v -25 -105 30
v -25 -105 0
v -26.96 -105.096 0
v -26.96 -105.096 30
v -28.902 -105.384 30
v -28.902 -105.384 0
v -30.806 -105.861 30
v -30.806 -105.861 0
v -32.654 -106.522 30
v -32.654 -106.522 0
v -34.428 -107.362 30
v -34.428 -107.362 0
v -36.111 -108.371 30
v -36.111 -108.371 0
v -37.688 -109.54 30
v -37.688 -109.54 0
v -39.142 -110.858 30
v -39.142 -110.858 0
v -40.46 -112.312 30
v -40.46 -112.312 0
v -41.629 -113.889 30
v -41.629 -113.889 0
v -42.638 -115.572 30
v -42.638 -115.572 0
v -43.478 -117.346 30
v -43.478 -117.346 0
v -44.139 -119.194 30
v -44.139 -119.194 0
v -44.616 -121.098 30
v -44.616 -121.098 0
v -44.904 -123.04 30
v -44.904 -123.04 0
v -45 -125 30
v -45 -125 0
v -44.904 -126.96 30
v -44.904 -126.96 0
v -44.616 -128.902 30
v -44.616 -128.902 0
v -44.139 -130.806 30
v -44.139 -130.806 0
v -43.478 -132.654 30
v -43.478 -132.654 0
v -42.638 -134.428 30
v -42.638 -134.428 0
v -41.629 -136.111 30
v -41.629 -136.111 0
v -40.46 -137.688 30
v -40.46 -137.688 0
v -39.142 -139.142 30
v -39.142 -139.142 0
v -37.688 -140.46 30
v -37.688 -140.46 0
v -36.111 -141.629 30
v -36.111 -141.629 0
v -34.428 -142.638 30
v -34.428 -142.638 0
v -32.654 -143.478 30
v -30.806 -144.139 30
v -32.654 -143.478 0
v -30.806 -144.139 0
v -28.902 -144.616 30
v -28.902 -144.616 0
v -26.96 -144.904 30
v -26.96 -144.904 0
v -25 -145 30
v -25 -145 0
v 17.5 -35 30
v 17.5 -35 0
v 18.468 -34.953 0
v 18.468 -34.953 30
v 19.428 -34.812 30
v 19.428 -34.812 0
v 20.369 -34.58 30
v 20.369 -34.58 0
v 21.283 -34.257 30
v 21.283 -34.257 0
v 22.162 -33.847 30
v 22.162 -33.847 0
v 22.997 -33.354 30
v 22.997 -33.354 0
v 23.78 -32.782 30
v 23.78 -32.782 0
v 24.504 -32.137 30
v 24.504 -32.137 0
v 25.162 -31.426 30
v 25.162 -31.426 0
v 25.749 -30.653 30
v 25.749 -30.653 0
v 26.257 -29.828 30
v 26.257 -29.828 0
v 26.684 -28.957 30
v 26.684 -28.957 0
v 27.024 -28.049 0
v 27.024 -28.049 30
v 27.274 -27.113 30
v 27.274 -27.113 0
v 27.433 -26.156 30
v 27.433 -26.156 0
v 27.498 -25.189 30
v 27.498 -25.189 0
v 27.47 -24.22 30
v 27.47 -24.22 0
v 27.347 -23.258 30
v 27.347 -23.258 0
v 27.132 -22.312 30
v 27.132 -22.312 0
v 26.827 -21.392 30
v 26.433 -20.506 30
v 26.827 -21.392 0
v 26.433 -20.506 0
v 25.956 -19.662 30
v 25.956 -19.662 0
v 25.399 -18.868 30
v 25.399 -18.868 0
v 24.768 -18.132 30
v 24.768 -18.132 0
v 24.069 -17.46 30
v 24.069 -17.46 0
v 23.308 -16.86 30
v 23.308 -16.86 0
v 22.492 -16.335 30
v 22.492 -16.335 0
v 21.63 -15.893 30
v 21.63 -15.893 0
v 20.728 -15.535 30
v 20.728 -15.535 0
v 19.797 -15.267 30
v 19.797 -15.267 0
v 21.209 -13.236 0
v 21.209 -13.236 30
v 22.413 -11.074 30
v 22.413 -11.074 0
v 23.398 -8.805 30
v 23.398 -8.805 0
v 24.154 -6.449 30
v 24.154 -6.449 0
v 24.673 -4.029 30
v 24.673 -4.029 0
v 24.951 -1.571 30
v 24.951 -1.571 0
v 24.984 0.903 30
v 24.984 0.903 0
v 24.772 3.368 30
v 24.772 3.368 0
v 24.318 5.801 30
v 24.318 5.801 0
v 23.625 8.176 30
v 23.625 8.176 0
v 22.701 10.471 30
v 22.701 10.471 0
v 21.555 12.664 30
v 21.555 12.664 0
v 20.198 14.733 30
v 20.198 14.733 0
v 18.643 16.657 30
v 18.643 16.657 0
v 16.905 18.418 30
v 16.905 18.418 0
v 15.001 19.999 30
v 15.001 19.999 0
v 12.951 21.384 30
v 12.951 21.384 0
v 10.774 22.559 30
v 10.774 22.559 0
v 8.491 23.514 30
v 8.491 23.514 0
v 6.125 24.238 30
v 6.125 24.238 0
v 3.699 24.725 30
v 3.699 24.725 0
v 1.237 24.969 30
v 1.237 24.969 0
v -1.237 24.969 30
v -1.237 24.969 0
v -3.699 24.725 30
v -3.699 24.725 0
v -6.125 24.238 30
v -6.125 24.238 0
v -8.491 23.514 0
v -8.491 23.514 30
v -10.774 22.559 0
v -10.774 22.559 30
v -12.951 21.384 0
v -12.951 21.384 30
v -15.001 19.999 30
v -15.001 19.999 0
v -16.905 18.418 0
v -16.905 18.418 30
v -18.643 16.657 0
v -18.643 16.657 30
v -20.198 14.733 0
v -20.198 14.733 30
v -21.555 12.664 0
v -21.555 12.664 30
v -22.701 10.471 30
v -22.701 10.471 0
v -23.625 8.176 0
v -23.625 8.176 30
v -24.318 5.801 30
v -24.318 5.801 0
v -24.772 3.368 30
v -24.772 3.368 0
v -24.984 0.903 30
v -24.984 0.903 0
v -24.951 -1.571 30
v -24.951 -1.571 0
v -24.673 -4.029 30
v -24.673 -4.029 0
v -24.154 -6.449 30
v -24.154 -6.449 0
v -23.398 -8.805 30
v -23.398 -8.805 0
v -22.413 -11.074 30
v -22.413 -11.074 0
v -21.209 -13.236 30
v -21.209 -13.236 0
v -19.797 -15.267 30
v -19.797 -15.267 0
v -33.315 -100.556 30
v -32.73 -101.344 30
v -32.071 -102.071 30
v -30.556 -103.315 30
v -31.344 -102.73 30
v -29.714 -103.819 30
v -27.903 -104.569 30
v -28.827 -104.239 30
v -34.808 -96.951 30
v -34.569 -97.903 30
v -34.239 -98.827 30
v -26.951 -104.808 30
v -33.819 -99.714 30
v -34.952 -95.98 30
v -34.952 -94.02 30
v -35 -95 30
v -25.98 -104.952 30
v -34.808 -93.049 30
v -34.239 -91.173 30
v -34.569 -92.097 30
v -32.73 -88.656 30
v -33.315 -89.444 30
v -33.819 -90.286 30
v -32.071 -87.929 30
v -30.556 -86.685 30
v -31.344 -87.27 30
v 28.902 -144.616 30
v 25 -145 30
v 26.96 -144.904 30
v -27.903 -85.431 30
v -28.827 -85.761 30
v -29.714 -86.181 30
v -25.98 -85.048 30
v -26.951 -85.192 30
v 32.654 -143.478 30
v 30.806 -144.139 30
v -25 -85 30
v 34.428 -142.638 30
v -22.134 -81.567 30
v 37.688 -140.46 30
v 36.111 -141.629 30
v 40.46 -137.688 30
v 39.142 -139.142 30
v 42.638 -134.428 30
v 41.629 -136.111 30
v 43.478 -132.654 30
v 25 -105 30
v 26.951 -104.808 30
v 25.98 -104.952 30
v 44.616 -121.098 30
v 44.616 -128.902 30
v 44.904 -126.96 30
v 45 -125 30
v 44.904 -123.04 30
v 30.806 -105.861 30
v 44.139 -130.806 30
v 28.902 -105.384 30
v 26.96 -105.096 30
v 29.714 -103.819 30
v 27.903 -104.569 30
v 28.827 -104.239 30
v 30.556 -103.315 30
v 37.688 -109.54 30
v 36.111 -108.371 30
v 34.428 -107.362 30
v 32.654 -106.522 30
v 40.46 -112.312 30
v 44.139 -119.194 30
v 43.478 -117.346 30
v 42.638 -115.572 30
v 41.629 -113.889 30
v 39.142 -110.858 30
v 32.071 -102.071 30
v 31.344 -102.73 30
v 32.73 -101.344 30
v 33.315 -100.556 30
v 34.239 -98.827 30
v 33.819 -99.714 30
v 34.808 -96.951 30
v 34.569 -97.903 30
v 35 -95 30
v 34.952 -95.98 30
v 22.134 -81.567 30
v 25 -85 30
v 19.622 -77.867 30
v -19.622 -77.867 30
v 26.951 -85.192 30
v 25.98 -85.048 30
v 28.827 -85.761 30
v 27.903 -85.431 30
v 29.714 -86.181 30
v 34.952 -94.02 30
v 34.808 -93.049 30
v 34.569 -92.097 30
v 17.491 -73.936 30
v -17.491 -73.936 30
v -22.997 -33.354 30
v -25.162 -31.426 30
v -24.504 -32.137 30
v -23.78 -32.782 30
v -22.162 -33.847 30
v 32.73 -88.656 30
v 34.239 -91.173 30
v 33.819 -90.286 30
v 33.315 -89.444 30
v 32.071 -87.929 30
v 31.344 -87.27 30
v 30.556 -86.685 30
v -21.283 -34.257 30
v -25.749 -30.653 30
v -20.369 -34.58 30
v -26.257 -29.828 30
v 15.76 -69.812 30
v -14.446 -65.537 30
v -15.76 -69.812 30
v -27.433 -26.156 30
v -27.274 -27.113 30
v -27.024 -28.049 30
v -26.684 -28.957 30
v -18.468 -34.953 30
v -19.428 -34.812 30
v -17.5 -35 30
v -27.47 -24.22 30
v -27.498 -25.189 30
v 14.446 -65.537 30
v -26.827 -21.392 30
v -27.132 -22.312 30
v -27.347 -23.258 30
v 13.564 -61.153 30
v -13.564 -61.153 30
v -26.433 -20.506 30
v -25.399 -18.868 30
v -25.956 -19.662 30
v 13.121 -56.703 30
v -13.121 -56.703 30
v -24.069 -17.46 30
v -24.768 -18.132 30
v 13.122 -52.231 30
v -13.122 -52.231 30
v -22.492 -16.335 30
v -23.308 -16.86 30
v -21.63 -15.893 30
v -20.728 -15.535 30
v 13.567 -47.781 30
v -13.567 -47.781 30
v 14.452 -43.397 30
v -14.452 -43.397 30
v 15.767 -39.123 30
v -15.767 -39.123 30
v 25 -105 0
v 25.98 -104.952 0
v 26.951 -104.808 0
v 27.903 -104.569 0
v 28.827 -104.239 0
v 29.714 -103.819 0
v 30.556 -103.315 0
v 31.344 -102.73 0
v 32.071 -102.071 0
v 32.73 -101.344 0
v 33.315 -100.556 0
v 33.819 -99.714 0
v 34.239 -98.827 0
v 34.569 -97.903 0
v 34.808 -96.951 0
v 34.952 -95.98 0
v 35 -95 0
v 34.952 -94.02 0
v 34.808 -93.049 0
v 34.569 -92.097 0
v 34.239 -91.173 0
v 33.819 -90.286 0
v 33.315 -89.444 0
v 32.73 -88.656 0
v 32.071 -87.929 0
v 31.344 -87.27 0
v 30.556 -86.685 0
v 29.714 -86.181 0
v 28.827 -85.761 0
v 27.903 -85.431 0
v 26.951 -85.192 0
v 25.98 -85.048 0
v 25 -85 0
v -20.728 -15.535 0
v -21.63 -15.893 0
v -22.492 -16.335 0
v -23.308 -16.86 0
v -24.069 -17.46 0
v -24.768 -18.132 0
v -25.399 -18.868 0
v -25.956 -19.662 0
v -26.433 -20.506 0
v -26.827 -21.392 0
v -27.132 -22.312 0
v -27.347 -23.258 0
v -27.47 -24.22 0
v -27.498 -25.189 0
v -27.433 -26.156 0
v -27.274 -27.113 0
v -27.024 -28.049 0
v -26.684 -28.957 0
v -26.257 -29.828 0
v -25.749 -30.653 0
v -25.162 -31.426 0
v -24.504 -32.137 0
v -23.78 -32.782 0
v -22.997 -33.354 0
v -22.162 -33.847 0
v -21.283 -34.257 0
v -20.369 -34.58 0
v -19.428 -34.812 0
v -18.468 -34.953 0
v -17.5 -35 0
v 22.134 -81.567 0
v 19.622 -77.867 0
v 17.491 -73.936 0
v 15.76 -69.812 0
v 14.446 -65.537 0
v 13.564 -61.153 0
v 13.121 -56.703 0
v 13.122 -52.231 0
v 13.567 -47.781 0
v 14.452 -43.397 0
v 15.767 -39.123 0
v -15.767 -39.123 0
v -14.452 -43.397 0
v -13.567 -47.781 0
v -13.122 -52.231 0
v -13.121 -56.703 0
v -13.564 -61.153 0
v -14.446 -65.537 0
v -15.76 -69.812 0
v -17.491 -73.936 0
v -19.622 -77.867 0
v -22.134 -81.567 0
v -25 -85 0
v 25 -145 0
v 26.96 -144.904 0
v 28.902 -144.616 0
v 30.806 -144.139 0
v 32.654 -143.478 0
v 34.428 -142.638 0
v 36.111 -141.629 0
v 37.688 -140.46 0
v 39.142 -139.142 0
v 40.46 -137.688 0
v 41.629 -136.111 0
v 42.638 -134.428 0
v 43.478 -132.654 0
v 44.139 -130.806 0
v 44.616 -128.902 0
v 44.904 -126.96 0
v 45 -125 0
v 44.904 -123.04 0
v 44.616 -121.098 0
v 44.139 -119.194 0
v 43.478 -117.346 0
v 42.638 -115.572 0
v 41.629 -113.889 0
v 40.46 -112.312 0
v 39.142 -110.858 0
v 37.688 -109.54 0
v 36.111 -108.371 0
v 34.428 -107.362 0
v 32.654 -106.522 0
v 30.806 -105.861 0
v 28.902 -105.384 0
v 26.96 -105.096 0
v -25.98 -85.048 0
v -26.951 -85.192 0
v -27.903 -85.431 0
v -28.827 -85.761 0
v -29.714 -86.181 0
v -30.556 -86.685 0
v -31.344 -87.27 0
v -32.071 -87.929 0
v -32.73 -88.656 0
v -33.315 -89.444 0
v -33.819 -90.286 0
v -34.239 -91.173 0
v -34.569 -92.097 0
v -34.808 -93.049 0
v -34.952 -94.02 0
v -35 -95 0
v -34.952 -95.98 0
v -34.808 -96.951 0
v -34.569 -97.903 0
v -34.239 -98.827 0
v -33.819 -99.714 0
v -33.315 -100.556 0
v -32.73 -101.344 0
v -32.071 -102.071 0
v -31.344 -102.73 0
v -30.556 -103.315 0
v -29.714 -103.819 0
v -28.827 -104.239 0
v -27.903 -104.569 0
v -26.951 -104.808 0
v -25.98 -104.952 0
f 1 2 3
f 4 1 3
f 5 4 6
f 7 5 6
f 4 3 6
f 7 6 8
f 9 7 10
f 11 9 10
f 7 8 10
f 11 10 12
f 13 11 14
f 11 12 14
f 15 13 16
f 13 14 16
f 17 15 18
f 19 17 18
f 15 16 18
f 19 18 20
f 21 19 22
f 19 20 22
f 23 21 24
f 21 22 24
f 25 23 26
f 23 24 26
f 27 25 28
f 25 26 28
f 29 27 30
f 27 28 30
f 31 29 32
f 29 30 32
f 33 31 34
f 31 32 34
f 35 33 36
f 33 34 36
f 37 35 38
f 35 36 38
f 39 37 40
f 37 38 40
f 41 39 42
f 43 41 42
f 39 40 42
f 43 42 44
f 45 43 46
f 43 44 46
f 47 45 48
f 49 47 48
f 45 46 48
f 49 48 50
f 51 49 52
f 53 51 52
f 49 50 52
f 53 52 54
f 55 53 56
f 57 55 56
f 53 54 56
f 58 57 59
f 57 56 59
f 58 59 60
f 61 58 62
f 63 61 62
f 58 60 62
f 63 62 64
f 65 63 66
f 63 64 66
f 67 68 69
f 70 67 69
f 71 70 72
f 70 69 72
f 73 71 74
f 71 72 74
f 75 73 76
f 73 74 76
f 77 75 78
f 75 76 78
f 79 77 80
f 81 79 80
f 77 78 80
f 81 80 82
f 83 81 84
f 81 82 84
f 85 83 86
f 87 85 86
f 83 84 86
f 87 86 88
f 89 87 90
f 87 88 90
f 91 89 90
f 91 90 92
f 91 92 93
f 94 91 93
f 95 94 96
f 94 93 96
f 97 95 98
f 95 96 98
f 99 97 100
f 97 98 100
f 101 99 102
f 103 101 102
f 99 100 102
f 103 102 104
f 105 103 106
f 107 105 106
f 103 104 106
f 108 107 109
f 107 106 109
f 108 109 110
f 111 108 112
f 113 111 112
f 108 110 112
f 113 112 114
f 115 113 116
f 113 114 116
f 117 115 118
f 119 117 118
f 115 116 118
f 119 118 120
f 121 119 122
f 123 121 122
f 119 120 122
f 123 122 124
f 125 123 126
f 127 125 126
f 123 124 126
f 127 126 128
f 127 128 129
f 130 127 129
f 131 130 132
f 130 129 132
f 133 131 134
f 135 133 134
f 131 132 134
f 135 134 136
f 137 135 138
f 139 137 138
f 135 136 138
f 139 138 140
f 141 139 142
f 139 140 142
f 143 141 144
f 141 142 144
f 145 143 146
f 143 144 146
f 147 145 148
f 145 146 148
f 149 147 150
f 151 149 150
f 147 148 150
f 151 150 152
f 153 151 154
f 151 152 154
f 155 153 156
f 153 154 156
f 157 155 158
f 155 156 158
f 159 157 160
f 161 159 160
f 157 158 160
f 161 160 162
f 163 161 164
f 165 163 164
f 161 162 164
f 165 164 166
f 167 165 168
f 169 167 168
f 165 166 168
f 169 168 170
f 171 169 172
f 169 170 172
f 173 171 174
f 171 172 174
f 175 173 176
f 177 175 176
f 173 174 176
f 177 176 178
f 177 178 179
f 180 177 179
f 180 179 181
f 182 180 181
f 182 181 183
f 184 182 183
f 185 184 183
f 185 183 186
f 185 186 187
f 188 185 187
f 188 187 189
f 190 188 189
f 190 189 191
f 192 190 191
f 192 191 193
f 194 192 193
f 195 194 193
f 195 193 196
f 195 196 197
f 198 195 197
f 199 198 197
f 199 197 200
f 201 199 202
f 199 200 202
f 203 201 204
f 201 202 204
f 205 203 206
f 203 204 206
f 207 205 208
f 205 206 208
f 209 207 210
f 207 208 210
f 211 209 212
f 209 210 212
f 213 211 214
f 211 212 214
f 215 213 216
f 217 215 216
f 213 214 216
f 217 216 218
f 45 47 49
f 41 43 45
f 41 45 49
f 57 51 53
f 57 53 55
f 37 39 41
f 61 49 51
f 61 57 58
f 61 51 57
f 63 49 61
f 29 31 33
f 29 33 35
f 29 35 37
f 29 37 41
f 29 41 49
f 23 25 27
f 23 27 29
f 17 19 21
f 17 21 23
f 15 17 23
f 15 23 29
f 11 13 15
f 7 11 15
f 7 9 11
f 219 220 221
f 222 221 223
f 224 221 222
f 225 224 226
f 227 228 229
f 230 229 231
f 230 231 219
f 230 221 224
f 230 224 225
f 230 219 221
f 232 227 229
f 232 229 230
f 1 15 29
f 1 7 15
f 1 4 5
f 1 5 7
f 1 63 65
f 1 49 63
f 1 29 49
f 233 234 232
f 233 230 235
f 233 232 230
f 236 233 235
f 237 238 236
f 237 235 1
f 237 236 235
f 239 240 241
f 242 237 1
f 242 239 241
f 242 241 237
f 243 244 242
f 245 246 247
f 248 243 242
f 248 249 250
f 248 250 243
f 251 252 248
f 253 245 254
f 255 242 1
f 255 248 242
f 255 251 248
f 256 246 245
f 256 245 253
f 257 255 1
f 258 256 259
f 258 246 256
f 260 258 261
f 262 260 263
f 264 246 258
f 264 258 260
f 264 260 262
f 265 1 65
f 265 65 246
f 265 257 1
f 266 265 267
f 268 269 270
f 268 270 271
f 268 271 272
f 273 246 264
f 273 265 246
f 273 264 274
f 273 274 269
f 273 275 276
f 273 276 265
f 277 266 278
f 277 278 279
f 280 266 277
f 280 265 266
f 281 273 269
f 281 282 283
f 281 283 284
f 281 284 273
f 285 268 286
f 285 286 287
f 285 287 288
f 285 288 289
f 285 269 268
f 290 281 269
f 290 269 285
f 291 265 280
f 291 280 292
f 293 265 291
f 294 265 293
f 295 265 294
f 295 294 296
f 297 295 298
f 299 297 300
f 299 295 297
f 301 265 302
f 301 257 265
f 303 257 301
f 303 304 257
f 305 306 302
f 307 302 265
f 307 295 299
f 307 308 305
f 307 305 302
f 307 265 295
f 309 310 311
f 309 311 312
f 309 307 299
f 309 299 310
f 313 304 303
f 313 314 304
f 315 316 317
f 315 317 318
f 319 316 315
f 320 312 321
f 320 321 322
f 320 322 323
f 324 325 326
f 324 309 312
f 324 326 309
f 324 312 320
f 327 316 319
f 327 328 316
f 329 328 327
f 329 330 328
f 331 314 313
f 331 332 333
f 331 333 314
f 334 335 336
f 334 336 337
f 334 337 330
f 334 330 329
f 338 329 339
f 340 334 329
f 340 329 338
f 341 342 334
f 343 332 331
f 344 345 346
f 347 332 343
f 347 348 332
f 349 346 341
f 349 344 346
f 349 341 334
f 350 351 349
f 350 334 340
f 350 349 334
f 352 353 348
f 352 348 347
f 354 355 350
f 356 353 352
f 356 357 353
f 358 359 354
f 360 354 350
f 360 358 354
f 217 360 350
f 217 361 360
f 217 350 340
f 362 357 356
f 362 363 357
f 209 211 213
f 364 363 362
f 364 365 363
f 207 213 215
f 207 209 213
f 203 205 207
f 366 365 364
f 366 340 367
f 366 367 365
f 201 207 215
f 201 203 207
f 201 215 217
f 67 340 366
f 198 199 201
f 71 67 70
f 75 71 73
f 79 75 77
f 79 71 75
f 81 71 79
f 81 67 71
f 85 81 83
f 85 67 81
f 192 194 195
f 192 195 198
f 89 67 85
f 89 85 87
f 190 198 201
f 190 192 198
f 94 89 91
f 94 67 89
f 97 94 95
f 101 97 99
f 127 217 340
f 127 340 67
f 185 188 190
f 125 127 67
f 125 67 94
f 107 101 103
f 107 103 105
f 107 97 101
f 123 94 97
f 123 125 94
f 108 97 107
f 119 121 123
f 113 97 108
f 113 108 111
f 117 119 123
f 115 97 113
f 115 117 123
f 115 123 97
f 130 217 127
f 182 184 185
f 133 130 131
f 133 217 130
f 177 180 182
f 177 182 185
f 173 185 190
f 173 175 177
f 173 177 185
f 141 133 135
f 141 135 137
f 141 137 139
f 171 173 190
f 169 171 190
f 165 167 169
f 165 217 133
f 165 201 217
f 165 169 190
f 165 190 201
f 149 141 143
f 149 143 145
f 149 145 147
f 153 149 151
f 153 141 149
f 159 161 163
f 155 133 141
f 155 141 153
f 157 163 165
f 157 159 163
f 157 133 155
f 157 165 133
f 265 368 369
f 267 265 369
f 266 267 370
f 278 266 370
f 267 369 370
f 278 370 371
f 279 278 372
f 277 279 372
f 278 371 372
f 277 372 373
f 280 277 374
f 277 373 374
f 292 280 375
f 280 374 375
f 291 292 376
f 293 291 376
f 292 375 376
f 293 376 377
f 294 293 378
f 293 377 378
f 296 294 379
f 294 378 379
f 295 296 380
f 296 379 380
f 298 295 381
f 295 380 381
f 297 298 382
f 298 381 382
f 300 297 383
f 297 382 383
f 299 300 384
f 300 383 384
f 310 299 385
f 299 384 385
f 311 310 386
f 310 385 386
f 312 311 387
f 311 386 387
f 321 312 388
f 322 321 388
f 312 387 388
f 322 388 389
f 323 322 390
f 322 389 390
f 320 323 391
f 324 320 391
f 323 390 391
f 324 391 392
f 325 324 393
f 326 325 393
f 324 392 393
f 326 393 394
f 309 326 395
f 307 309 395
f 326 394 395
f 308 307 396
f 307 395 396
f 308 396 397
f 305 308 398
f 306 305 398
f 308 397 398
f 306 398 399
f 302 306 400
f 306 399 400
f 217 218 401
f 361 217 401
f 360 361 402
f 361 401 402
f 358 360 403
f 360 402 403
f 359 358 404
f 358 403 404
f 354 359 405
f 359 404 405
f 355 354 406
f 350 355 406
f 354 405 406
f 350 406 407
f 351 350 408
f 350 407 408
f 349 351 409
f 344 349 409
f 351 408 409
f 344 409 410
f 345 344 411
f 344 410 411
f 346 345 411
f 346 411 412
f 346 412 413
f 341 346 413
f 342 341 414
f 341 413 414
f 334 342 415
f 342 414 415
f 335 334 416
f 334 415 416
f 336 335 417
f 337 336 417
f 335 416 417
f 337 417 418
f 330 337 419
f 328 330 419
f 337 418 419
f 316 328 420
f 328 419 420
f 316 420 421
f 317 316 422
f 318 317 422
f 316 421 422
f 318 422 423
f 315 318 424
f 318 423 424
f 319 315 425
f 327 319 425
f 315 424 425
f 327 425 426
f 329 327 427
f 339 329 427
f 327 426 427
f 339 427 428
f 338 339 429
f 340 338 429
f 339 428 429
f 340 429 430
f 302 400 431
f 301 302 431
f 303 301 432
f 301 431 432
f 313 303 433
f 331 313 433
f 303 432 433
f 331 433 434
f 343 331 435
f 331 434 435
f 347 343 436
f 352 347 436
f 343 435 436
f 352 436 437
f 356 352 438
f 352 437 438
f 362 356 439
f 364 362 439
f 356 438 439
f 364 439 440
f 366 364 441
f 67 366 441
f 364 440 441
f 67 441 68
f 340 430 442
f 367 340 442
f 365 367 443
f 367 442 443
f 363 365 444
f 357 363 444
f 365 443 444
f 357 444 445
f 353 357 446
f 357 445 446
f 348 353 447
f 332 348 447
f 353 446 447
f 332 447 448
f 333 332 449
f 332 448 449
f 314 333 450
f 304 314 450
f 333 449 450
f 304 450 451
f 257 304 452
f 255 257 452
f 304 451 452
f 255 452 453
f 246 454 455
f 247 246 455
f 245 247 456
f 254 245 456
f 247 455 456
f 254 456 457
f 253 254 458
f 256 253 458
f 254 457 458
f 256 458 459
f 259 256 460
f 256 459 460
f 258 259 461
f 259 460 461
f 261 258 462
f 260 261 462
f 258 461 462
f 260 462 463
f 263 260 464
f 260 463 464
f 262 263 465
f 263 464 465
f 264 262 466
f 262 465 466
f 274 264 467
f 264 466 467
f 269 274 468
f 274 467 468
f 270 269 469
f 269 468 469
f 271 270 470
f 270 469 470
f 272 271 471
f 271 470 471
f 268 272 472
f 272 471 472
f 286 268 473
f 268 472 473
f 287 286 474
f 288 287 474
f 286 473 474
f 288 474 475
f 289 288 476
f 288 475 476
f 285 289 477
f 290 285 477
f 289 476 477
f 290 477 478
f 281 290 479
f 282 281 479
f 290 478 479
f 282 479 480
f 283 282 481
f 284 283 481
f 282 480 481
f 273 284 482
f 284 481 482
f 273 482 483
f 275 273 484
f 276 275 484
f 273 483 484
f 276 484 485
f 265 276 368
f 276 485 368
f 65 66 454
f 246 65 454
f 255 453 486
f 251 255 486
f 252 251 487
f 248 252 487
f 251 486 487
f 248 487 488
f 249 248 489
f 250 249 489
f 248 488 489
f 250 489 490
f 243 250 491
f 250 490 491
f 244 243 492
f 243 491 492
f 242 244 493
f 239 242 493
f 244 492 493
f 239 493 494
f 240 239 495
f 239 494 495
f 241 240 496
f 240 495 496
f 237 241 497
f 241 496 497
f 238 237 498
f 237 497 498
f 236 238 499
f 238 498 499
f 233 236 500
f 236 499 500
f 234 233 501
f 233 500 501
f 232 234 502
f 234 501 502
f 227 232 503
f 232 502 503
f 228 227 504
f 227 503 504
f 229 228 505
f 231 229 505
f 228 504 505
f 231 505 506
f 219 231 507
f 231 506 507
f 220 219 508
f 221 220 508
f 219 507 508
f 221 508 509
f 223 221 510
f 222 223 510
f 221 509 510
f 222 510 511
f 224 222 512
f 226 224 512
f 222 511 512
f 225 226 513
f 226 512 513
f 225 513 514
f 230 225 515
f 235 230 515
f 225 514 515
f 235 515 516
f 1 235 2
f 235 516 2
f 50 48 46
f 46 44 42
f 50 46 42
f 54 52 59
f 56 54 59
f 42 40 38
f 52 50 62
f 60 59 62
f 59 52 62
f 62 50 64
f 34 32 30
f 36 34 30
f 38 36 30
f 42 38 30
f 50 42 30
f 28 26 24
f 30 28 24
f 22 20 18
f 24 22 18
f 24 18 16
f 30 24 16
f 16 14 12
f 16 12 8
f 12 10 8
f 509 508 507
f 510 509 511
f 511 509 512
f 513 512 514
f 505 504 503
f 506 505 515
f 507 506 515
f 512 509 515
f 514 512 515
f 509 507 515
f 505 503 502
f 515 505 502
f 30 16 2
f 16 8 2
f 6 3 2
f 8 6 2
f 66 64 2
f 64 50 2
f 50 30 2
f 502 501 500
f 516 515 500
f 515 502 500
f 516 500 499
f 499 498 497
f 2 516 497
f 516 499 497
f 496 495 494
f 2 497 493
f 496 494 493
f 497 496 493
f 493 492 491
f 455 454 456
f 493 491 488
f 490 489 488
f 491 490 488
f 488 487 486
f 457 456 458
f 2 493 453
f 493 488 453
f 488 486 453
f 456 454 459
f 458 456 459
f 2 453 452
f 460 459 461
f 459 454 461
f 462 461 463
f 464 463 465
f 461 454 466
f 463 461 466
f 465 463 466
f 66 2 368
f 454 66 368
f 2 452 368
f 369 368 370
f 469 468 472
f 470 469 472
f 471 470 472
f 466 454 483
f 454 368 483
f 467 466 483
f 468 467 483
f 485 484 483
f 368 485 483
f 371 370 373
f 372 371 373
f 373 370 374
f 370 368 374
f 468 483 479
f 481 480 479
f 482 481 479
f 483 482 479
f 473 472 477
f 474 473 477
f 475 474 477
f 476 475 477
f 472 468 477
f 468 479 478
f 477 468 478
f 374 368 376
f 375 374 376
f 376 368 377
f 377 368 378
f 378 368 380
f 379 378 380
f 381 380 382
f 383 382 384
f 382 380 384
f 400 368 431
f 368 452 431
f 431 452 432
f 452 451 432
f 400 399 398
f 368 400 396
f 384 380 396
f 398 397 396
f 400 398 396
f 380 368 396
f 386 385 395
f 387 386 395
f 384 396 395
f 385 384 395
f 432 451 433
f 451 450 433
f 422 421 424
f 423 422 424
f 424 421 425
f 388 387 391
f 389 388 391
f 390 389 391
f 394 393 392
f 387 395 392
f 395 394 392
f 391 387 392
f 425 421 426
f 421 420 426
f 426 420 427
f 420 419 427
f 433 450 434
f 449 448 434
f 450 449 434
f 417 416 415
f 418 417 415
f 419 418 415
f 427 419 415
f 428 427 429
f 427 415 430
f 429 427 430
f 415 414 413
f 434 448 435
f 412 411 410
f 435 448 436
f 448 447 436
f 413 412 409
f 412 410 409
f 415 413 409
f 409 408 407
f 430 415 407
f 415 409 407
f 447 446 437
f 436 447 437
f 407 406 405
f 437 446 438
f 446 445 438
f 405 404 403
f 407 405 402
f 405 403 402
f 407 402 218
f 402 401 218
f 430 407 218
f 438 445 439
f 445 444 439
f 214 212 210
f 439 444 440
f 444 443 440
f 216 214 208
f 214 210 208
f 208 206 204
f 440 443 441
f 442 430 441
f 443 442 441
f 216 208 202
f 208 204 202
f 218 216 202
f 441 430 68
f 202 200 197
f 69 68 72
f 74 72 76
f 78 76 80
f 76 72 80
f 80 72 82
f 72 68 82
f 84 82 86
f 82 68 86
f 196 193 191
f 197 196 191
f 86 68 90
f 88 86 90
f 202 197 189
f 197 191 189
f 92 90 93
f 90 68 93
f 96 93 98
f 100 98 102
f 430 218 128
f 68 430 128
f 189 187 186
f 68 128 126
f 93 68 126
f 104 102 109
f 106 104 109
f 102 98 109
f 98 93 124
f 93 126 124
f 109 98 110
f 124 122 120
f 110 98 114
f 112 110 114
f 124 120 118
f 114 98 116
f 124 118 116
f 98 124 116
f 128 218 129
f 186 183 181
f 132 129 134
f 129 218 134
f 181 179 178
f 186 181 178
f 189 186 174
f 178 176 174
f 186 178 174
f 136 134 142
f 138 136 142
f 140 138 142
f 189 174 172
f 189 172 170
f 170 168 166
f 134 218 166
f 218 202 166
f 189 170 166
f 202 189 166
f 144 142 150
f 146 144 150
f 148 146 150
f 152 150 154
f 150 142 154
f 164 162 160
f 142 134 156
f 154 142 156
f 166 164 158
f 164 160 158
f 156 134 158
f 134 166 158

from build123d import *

# Parameters (mm, degrees)
BOSS_EXTRUDE3_DEPTH = 30


with BuildPart() as part:
    # Sketch1 → Boss-Extrude3 (new body)
    with BuildSketch(Plane.XY):
        with BuildLine():
            ThreePointArc((19.796695306, -15.267313286), (0, 25), (-19.796695306, -15.267313286))
            ThreePointArc((-19.796695306, -15.267313286), (-27.432946872, -26.156099663), (-17.5, -35))
            ThreePointArc((-17.5, -35), (-13.564166187, -61.152875072), (-25, -85))
            ThreePointArc((-25, -85), (-35, -95), (-25, -105))
            ThreePointArc((-25, -105), (-45, -125), (-25, -145))
            Line((-25, -145), (25, -145))
            ThreePointArc((25, -145), (45, -125), (25, -105))
            ThreePointArc((25, -105), (35, -95), (25, -85))
            ThreePointArc((25, -85), (13.564166187, -61.152875072), (17.5, -35))
            ThreePointArc((17.5, -35), (27.432946872, -26.156099663), (19.796695306, -15.267313286))
        make_face()
    extrude(amount=BOSS_EXTRUDE3_DEPTH)


solid = part.part
